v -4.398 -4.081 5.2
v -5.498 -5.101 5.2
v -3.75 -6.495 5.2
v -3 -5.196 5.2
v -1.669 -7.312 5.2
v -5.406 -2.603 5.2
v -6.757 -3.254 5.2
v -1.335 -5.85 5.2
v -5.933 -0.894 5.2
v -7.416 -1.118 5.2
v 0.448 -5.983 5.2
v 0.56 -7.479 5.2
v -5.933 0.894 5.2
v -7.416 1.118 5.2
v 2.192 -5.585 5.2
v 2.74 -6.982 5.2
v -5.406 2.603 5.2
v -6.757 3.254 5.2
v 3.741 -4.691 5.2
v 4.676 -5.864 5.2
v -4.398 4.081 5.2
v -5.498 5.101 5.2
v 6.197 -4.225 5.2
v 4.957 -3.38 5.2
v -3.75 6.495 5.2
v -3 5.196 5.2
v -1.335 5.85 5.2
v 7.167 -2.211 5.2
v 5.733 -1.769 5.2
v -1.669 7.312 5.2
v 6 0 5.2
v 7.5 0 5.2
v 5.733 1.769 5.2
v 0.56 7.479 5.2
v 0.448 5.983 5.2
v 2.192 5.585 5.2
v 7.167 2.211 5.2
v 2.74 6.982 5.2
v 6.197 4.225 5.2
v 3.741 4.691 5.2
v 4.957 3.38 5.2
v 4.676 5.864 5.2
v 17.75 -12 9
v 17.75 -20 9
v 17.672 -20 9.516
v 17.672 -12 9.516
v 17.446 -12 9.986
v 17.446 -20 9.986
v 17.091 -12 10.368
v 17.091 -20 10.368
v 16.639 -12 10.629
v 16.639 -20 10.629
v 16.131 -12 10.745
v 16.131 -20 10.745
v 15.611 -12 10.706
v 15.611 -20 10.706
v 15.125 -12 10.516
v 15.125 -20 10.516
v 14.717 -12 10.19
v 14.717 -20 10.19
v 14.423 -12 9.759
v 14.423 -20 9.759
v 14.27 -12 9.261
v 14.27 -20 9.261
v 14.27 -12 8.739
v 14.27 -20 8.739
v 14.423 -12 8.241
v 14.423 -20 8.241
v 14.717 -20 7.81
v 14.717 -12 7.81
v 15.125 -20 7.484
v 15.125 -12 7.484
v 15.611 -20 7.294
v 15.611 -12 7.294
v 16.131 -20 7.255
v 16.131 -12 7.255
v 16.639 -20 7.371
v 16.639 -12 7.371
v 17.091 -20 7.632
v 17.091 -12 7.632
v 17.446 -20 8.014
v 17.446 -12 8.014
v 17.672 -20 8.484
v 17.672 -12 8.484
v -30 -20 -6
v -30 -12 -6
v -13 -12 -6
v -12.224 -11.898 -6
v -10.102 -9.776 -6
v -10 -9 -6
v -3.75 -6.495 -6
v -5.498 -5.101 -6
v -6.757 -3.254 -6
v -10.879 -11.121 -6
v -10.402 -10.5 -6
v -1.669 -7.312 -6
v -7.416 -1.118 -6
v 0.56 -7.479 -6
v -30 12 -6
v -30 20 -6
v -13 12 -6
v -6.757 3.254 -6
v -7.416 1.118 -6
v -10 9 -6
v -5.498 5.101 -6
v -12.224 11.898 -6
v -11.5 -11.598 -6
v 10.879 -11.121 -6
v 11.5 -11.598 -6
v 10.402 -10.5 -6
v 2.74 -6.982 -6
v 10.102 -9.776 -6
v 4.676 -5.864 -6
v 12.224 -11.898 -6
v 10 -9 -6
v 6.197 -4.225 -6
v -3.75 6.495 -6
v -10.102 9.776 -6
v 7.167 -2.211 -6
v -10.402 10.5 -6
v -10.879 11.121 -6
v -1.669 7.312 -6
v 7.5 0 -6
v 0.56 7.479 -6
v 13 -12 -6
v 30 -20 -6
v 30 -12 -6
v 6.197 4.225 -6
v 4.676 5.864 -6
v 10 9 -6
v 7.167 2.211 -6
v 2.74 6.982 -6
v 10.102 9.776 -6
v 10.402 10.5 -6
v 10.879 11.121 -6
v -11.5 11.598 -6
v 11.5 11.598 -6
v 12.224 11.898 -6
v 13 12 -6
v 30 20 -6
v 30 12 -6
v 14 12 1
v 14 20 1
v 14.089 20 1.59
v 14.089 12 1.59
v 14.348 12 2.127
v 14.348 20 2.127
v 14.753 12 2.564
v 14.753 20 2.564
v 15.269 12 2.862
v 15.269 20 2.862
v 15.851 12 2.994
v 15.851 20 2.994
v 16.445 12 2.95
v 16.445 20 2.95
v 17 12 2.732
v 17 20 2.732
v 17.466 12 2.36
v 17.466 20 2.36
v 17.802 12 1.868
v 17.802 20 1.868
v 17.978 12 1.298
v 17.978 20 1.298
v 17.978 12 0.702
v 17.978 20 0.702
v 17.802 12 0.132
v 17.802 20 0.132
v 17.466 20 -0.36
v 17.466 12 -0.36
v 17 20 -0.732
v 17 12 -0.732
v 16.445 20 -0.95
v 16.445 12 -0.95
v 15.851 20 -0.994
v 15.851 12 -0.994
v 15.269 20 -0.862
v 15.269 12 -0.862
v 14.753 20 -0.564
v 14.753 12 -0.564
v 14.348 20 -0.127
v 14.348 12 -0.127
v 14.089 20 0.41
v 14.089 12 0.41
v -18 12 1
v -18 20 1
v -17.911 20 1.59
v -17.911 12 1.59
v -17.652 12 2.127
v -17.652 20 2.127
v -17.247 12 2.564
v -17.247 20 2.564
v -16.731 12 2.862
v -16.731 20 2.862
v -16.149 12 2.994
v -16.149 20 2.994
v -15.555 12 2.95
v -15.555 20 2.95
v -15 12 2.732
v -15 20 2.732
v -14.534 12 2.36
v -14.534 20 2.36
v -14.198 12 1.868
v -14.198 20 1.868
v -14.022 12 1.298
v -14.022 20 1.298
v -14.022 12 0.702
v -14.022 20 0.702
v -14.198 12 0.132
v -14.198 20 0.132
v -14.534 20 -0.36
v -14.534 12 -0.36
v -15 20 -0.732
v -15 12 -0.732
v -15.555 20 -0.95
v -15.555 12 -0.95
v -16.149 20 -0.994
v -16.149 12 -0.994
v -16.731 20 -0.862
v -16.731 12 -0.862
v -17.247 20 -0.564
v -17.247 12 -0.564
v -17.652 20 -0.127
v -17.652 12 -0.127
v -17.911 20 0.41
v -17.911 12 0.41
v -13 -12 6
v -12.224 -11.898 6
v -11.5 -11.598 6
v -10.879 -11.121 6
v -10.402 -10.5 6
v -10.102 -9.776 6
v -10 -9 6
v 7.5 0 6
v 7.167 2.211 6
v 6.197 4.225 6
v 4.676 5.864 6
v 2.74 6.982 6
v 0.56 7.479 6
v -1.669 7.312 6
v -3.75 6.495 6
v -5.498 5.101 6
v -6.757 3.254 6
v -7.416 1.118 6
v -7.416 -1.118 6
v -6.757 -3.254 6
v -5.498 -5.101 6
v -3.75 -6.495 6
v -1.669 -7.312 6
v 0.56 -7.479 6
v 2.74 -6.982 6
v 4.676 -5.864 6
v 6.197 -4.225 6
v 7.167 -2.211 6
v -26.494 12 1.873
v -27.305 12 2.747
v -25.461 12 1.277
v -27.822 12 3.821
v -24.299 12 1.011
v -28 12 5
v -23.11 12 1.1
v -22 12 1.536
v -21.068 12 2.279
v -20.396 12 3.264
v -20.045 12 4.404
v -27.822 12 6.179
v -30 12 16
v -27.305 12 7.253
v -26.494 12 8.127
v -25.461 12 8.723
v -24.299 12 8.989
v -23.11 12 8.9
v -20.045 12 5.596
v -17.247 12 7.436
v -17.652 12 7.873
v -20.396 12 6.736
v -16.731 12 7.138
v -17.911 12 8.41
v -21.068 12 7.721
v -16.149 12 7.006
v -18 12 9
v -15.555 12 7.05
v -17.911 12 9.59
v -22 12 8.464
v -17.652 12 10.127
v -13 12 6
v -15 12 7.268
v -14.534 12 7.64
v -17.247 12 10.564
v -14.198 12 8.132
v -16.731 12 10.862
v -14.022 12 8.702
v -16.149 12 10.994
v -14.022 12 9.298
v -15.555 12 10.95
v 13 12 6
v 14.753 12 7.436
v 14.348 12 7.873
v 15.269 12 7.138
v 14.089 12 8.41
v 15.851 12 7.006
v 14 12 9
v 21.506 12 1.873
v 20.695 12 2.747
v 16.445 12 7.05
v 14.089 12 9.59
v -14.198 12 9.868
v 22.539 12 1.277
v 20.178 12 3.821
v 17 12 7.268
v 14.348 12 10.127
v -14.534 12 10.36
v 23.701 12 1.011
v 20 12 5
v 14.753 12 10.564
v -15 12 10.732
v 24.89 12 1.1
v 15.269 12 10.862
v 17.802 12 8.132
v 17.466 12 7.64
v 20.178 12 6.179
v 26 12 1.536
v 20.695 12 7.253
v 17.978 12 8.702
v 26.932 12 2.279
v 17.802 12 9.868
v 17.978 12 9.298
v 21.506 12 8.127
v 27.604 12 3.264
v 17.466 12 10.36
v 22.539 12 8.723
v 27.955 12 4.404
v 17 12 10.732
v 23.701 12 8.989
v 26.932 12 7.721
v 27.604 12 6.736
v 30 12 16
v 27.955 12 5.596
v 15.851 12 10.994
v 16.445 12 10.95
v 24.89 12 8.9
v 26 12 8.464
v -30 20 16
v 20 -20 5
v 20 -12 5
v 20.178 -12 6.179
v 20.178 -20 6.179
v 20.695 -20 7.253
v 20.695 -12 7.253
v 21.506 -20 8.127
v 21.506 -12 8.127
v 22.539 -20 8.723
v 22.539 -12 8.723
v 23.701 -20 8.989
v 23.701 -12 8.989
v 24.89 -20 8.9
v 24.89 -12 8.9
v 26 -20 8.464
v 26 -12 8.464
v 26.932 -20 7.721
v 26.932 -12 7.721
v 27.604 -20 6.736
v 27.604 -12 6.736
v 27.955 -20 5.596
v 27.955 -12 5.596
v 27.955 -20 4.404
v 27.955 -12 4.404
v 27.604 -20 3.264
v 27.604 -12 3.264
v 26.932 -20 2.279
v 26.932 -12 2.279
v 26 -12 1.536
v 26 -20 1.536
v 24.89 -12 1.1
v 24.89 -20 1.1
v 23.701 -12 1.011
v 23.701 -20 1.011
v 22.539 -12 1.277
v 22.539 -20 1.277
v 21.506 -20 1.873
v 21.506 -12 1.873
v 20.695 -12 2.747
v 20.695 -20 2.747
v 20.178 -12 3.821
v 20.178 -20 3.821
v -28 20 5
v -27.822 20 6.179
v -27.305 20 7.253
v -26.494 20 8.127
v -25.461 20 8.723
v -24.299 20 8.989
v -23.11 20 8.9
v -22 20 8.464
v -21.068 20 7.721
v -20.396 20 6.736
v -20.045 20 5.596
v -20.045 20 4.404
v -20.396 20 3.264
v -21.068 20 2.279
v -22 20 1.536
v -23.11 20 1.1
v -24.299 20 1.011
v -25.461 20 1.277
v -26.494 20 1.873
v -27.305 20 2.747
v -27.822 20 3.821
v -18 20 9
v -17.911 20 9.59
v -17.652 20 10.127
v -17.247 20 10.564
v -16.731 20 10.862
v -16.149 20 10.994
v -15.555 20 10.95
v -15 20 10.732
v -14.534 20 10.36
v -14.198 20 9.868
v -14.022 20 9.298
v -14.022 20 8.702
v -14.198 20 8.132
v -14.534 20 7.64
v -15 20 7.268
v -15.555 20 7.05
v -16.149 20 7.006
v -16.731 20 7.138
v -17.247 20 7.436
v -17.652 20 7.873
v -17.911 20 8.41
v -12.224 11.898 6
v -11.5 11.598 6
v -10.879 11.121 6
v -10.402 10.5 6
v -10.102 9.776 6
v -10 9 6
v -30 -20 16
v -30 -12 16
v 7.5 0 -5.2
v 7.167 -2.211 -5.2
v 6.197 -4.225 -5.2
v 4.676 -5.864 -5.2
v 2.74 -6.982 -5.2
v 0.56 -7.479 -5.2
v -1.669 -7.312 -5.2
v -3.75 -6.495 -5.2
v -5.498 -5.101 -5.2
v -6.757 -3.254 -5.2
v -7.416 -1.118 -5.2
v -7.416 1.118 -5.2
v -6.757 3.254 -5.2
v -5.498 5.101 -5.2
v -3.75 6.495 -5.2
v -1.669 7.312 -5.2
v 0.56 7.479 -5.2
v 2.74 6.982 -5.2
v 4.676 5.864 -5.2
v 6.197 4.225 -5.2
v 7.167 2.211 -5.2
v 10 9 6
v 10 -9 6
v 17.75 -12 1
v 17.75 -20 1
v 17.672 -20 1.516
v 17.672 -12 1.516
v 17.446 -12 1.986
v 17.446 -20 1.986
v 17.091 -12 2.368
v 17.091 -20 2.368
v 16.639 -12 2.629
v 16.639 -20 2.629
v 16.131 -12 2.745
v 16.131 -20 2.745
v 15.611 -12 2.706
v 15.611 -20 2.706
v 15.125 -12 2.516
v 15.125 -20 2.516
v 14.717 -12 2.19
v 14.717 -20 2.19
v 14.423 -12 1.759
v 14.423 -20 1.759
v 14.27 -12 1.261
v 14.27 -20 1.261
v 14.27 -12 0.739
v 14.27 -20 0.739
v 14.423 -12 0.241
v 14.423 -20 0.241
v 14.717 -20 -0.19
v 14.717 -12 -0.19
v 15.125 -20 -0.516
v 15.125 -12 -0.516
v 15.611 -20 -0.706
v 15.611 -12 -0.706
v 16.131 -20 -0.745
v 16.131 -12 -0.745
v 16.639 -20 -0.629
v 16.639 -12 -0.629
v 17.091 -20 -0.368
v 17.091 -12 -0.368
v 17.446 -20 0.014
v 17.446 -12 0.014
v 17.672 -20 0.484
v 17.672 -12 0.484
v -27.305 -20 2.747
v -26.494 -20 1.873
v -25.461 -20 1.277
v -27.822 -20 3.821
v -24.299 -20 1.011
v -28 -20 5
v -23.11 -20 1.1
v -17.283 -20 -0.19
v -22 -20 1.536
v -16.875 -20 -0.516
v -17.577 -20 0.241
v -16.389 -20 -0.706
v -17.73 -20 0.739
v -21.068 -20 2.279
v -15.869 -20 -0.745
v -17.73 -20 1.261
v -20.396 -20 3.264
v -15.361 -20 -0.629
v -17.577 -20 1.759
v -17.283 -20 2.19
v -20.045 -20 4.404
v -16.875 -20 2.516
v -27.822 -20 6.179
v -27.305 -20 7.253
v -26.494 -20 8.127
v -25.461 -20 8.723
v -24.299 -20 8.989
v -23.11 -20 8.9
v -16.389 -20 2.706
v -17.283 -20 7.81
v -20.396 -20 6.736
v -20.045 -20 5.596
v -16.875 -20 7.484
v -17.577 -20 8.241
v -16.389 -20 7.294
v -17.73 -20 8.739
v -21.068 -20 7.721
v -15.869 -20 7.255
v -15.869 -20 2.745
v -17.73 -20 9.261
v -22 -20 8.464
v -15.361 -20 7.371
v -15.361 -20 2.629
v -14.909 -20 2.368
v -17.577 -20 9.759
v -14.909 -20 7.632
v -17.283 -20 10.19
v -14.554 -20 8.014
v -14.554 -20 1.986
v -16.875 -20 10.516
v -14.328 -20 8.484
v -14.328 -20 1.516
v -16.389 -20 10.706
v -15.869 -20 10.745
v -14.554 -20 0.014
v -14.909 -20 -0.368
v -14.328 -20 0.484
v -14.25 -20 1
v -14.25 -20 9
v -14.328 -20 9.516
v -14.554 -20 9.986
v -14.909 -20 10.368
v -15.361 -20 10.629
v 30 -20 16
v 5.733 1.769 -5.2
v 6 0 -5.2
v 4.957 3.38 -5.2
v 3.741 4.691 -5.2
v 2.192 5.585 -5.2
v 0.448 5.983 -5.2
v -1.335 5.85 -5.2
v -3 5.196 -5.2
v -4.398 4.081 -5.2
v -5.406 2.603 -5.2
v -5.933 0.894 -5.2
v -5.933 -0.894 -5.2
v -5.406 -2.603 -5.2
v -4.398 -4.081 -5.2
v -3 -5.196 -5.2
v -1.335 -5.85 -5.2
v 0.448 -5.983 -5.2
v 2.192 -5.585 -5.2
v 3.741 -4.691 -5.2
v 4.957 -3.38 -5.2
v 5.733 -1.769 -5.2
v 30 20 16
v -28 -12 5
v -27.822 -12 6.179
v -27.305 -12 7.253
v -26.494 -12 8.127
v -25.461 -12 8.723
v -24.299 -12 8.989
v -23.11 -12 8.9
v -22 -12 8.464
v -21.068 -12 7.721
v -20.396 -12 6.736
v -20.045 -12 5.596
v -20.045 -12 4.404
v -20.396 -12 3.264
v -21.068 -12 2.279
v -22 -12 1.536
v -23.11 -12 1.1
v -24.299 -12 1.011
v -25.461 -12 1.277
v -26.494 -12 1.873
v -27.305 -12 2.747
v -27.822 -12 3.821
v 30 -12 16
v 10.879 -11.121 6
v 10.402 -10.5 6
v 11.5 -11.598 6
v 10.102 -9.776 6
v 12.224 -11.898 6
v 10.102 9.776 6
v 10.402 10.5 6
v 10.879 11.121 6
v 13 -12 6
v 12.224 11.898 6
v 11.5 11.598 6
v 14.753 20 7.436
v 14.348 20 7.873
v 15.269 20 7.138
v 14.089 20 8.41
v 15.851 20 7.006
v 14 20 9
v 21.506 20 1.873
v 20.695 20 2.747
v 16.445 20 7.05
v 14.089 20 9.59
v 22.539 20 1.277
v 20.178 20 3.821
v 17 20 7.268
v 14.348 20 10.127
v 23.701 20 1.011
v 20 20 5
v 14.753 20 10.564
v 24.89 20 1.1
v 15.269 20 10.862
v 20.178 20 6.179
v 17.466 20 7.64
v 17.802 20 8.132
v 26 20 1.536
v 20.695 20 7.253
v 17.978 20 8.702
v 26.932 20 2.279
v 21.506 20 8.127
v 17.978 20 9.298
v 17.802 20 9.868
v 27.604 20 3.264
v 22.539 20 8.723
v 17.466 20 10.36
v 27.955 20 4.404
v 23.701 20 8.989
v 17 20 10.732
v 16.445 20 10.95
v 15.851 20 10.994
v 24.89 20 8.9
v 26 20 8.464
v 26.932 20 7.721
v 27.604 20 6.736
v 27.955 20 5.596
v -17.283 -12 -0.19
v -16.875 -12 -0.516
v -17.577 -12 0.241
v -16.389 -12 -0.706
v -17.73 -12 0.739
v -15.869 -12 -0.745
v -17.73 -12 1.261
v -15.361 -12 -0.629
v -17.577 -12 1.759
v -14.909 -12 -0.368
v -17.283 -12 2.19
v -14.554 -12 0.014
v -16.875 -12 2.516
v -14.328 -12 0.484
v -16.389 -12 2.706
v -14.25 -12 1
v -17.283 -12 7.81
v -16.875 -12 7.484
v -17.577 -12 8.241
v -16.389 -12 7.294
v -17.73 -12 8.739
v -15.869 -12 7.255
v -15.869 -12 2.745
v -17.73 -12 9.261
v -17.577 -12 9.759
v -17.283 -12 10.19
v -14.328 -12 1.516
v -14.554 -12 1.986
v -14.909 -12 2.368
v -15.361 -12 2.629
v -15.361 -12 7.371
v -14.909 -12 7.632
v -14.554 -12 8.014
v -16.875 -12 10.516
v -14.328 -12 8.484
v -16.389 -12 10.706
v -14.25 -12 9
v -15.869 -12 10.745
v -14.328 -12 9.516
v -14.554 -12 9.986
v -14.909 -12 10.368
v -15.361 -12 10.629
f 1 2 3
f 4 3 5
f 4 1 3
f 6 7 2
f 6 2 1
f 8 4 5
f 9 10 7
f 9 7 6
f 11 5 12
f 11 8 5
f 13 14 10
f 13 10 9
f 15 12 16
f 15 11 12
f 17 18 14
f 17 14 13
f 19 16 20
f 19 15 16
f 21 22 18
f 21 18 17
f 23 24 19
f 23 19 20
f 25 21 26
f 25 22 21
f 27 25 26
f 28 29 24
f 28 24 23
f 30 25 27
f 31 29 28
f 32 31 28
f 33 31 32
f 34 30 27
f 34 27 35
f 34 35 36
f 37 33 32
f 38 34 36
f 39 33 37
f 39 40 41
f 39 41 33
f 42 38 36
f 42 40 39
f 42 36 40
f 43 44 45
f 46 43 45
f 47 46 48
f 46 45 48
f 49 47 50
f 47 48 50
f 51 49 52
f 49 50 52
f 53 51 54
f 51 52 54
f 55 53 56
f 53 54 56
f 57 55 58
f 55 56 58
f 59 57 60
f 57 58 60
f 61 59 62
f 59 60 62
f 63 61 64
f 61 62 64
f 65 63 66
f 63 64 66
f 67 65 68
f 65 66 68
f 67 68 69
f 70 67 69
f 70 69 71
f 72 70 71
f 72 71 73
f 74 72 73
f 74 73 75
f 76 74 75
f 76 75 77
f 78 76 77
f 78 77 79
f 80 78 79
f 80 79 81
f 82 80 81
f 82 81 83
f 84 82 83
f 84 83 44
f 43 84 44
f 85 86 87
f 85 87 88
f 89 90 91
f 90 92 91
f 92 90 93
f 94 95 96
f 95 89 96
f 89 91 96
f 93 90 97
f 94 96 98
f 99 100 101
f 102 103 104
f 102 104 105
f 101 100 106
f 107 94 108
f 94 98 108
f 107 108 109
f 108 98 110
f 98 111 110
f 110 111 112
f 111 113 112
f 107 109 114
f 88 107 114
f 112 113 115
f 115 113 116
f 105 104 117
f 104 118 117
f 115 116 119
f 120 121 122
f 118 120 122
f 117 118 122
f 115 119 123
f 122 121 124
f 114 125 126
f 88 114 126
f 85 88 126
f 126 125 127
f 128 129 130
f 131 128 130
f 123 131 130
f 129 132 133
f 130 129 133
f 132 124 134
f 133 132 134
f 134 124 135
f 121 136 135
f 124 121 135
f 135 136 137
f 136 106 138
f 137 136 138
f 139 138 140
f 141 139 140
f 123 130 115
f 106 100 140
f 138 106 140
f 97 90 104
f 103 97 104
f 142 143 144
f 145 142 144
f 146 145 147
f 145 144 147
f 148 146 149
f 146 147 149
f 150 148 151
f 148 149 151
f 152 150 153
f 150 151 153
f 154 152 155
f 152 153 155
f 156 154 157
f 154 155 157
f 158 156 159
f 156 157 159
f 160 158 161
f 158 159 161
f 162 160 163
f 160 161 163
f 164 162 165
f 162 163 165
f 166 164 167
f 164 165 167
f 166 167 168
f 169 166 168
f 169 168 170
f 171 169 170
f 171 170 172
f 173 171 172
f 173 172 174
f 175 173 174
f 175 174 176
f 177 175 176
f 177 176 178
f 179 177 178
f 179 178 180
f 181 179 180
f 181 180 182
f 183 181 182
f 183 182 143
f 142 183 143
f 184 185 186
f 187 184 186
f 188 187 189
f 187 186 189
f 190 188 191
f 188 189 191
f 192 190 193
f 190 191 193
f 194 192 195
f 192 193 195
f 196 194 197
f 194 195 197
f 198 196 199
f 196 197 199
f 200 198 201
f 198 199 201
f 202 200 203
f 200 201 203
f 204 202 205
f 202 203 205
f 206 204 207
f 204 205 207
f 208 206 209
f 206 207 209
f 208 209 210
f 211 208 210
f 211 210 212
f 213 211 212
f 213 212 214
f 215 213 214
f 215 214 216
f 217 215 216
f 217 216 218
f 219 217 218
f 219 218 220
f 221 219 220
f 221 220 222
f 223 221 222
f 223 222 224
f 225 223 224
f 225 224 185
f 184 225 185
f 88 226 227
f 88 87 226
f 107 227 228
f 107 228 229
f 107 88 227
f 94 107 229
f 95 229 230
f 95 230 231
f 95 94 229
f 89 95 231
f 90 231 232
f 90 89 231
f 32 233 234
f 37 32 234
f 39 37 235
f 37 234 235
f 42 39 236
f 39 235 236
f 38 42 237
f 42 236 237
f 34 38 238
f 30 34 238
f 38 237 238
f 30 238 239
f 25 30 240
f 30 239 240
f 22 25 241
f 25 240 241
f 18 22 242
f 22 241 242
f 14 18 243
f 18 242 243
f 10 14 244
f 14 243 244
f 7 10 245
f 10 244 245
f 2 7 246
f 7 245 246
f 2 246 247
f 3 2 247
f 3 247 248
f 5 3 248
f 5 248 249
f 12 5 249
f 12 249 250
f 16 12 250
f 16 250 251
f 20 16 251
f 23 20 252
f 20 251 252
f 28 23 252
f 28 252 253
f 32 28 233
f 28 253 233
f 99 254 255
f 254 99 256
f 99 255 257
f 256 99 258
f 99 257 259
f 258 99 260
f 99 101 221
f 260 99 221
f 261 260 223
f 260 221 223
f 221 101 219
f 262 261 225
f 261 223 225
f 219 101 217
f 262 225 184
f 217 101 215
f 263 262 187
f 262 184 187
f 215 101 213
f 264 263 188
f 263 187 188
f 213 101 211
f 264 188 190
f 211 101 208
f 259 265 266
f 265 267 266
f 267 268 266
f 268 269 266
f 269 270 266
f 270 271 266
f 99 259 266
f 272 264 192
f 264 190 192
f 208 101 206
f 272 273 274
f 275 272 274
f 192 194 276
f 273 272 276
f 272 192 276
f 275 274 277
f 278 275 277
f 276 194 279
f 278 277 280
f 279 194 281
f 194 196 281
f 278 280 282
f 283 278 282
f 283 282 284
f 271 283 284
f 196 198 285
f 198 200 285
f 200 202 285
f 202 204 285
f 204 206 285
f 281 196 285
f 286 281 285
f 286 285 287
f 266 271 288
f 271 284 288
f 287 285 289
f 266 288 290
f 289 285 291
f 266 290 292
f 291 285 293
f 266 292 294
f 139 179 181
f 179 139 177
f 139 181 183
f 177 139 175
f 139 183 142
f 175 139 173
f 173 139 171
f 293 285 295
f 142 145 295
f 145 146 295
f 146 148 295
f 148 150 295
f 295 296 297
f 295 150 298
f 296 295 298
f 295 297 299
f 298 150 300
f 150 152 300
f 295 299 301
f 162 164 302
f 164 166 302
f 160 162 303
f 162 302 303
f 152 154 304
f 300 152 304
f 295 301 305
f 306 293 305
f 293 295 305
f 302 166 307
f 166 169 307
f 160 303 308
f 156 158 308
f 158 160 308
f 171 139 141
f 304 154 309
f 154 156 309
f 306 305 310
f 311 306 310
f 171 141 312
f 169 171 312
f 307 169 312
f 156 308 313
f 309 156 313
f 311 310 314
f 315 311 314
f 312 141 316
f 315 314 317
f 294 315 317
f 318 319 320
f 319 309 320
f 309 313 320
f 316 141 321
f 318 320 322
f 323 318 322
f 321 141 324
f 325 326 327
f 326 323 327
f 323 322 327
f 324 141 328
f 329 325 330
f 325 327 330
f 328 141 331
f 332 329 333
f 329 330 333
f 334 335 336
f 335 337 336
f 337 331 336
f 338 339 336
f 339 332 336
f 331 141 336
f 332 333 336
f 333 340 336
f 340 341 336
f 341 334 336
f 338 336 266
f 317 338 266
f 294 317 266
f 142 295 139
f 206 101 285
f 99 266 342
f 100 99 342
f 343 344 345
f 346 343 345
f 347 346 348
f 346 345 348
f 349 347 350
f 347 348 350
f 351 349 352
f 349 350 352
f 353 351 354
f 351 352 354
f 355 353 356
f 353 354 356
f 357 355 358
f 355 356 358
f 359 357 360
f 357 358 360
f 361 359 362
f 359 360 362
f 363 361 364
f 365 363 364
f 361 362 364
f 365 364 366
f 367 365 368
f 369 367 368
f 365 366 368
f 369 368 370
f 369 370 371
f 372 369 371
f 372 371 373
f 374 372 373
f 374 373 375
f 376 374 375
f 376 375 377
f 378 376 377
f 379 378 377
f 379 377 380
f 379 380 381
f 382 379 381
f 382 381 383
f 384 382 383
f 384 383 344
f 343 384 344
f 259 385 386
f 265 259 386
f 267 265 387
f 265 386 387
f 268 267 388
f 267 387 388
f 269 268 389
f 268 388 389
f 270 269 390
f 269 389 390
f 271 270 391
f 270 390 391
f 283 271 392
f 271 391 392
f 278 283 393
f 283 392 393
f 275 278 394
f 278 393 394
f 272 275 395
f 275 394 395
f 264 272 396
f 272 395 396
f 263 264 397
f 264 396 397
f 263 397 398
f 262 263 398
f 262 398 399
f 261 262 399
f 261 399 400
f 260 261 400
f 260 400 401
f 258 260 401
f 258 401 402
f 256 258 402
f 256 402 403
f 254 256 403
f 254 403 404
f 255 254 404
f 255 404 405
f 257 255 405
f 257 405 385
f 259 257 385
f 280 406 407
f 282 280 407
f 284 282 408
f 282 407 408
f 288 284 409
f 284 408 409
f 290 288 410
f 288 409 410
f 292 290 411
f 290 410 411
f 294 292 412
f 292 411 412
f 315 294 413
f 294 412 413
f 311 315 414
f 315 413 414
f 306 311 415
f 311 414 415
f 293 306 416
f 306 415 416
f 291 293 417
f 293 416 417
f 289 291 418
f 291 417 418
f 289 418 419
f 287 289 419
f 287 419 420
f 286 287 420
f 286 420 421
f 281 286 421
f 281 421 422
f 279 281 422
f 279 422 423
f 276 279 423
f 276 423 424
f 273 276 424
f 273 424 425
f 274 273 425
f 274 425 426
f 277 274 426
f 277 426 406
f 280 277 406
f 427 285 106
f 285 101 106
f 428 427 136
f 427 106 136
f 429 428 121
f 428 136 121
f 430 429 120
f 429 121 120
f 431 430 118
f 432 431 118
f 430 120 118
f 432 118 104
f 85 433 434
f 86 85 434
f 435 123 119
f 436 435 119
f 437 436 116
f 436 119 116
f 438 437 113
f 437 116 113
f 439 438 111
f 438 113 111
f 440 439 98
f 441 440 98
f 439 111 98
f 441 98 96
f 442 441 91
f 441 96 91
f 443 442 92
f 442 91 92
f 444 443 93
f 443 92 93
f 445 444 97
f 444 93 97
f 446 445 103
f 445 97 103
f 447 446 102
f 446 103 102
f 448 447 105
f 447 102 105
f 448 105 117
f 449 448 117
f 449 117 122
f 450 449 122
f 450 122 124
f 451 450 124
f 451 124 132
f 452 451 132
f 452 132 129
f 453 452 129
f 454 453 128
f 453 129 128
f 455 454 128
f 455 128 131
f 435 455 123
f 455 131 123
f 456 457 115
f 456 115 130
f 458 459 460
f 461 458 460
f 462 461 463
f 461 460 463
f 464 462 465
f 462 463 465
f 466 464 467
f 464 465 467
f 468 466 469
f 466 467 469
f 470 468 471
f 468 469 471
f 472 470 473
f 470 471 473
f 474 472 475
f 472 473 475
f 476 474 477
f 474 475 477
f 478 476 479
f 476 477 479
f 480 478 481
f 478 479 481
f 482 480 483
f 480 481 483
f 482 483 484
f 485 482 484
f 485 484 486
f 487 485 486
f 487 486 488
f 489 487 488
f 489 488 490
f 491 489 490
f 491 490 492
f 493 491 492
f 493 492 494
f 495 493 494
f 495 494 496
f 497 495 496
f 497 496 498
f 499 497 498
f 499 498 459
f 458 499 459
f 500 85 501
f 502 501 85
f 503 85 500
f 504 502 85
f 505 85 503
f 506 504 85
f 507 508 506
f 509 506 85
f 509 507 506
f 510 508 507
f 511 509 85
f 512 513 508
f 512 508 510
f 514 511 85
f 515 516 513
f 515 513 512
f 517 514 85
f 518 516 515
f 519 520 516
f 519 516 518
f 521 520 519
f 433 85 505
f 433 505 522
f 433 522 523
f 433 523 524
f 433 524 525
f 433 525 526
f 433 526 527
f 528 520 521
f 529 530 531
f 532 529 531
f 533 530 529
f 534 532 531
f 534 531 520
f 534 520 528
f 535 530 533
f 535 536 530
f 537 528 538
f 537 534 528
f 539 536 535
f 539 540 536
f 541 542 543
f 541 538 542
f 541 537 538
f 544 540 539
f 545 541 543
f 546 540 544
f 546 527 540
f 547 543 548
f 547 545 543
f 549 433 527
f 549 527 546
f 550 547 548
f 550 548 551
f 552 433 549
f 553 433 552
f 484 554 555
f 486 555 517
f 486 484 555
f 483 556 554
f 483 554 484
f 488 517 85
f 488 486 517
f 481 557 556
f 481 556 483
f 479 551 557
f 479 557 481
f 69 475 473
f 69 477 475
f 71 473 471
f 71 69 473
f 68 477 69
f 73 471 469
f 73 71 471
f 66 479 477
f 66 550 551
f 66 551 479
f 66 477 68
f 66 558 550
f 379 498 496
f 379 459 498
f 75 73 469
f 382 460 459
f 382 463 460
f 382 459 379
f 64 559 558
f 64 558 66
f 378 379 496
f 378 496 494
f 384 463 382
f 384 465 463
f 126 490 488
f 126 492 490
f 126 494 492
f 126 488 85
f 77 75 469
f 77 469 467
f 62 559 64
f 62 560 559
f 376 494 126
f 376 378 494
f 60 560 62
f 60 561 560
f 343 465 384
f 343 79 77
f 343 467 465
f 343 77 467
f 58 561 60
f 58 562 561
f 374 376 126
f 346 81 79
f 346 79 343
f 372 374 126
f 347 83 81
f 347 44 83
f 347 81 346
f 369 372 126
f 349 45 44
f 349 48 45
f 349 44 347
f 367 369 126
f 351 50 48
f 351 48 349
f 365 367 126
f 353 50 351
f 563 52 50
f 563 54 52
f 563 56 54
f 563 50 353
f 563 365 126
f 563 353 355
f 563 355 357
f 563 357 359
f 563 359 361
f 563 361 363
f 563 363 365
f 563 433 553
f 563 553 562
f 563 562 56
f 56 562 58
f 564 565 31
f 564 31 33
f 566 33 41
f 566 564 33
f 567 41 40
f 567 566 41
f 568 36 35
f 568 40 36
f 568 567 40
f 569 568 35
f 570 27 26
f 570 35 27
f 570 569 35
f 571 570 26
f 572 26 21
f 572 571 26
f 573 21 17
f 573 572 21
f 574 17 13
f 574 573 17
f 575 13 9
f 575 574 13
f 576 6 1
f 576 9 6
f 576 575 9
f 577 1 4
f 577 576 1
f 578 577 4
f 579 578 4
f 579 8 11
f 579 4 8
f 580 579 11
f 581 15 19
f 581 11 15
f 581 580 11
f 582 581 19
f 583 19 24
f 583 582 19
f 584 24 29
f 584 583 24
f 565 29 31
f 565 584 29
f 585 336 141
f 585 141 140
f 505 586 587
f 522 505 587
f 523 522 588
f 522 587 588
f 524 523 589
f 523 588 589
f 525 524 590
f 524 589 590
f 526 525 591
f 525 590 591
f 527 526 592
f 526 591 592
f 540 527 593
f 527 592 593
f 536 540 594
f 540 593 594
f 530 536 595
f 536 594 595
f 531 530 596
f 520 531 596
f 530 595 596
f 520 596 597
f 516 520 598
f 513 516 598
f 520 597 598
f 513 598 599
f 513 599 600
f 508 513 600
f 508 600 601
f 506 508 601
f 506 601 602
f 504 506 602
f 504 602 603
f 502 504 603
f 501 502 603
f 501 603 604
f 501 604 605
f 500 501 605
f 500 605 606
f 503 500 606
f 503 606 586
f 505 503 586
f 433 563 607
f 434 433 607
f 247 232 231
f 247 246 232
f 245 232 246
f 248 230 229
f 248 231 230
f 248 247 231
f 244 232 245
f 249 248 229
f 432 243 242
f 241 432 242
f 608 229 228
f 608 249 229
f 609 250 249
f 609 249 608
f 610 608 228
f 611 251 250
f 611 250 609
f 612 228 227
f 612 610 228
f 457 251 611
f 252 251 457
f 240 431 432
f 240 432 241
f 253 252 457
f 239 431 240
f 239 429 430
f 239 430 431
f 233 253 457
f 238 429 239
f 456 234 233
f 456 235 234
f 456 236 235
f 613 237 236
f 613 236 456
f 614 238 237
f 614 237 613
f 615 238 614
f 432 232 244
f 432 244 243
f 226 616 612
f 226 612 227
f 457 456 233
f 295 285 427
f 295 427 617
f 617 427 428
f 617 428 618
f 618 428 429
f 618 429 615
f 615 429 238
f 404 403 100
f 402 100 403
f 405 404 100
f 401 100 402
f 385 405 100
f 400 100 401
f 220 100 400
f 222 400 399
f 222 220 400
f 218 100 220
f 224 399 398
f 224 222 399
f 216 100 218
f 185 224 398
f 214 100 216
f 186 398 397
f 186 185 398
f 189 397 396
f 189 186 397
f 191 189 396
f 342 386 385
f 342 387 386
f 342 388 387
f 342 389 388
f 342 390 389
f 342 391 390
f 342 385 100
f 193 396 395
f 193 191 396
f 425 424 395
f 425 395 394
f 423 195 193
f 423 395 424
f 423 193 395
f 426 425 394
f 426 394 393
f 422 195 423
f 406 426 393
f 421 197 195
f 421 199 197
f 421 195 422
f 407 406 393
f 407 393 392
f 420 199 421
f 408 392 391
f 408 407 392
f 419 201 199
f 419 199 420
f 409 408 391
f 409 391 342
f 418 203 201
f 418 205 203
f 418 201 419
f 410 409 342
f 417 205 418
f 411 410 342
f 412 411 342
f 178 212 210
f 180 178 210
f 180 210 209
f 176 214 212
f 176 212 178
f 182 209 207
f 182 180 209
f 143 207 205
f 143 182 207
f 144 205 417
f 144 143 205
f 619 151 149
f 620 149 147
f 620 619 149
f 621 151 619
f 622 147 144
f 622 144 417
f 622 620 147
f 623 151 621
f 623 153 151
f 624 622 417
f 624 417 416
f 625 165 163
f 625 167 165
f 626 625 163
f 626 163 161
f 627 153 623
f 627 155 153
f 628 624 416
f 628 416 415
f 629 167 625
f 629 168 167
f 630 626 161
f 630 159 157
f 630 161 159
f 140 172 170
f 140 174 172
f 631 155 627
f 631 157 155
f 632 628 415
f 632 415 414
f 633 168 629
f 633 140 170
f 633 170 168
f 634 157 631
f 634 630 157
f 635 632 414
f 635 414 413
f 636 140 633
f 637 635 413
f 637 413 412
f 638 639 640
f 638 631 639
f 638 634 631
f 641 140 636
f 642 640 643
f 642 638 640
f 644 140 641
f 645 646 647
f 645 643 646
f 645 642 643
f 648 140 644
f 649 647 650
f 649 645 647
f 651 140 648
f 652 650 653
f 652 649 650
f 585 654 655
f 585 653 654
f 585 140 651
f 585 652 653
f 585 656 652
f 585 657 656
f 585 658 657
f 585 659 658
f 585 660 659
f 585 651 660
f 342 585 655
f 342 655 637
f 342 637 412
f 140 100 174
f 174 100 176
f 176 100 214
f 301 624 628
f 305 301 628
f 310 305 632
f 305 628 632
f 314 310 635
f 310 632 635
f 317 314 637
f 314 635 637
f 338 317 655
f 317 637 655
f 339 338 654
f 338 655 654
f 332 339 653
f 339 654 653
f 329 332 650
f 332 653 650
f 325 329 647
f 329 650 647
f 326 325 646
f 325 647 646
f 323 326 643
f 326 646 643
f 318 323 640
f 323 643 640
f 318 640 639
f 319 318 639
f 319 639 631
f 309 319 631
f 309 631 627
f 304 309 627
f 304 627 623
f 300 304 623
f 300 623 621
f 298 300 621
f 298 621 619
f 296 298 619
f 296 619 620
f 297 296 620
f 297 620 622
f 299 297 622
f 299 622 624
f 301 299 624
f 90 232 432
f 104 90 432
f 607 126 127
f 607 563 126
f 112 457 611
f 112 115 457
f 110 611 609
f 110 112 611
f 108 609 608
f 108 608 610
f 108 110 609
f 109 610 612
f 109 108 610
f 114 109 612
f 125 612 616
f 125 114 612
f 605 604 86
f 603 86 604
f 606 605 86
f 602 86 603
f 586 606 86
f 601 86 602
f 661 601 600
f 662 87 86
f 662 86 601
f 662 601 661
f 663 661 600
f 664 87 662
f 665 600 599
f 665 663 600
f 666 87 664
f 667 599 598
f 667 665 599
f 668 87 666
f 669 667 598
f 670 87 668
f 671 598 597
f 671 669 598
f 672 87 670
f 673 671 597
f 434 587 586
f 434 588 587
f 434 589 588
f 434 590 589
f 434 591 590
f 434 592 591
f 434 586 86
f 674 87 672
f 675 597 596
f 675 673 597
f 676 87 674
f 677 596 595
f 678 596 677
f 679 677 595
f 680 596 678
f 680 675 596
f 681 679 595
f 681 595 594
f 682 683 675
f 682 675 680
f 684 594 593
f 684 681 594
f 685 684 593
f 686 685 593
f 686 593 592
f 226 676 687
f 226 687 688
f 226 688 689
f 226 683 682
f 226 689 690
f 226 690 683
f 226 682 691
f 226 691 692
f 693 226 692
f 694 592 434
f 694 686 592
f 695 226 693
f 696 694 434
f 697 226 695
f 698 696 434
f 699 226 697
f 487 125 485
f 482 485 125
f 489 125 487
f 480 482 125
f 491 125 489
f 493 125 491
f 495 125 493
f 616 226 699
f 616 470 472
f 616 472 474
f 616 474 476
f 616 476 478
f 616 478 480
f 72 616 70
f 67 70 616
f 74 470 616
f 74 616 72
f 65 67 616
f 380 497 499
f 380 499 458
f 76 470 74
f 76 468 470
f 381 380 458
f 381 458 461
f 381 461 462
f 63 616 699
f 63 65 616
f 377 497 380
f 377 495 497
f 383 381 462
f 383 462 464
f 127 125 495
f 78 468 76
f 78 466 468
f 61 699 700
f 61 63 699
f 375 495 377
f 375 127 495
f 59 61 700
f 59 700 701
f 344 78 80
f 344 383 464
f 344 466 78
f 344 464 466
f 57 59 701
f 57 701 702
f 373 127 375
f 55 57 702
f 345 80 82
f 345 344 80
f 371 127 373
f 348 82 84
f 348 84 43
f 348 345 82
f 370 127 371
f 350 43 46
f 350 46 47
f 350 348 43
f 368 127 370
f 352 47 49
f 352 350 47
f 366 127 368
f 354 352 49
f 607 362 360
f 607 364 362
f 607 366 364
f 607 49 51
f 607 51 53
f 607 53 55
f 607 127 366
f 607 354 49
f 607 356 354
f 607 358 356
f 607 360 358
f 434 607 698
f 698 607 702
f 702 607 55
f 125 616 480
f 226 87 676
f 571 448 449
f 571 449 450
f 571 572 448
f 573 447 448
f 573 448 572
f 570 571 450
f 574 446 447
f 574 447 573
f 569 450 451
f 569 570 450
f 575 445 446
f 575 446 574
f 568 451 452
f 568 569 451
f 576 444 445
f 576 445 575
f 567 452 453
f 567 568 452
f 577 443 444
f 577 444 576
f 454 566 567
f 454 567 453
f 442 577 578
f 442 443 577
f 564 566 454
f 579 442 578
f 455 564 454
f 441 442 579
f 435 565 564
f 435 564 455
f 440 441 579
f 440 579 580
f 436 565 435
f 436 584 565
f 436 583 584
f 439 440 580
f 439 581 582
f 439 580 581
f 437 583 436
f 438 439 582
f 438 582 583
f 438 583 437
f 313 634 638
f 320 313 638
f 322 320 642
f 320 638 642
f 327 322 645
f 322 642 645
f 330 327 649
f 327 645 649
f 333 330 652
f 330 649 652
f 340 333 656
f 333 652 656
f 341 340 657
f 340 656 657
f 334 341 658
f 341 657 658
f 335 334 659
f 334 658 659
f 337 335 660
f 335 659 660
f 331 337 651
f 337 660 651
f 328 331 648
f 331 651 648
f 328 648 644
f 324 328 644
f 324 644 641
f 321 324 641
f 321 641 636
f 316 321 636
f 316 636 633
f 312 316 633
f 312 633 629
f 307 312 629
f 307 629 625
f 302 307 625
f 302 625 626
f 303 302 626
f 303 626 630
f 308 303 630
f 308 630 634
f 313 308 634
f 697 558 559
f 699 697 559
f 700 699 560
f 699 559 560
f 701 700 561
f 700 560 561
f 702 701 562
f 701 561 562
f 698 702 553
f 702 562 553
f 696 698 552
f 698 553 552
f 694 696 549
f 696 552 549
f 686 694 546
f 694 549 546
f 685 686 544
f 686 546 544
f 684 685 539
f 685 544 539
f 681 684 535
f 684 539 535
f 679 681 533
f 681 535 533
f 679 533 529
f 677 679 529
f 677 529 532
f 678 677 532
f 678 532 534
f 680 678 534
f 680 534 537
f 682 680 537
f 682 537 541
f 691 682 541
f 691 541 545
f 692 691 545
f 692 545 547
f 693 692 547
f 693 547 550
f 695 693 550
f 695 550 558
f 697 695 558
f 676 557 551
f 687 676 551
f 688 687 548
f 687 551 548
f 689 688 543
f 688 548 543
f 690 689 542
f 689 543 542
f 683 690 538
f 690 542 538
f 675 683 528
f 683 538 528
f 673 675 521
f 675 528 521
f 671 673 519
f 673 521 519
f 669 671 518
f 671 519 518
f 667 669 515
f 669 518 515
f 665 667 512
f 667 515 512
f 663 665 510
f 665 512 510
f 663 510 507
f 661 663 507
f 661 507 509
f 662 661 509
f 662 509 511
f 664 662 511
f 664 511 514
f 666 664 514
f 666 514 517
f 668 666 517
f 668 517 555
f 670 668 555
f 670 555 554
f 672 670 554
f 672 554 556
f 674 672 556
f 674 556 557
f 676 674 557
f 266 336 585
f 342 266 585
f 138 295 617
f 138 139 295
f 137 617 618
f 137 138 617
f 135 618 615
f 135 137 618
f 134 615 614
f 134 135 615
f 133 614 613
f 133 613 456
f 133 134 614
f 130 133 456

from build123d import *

# Parameters (mm, degrees)
F0_W      = 60
F0_H      = 40
F0_R      = 6
F1_DEPTH  = 6
F2_W      = 8
F2_H      = 10
F3_DEPTH  = 60
F4_R      = 2
F5_DEPTH  = 10
F6_R      = 1.75
F7_DEPTH  = 10
F8_R      = 7.5
F9_DEPTH  = 0.8
F10_R     = 7.5
F11_DEPTH = 0.8
F12_W     = 20
F12_H     = 24
F13_DEPTH = 25
F14_R     = 3
F15_R     = 4
F16_DEPTH = 40.001


with BuildPart() as f1:
    # F0 (on Top) → F1 (new body, symmetric)
    with BuildSketch(Plane.XY):
        Rectangle(F0_W, F0_H)
        Circle(F0_R, mode=Mode.SUBTRACT)
    extrude(amount=F1_DEPTH, both=True)

    # F2 (on face) → F3 (join, through all)
    with BuildSketch(Plane.YZ.offset(30)):
        with Locations((16, 11)):
            Rectangle(F2_W, F2_H)
        with Locations((-16, 11)):
            Rectangle(F2_W, F2_H)
    extrude(amount=-F3_DEPTH)

    # F4 (on face) → F5 (cut)
    with BuildSketch(Plane(origin=(0, 20, 0), x_dir=(-1, 0, 0), z_dir=(0, 1, 0))):
        with Locations((16, 9)):
            Circle(F4_R)
        with Locations((-16, 9)):
            Circle(F4_R)
        with Locations((16, 1)):
            Circle(F4_R)
        with Locations((-16, 1)):
            Circle(F4_R)
    extrude(amount=-F5_DEPTH, mode=Mode.SUBTRACT)

    # F6 (on face) → F7 (cut)
    with BuildSketch(Plane.XZ.offset(20)):
        with Locations((16, 9)):
            Circle(F6_R)
        with Locations((-16, 9)):
            Circle(F6_R)
        with Locations((16, 1)):
            Circle(F6_R)
        with Locations((-16, 1)):
            Circle(F6_R)
    extrude(amount=-F7_DEPTH, mode=Mode.SUBTRACT)

    # F8 (on face) → F9 (cut)
    with BuildSketch(Plane.XY.offset(6)):
        Circle(F8_R)
    extrude(amount=-F9_DEPTH, mode=Mode.SUBTRACT)

    # F10 (on face) → F11 (cut)
    with BuildSketch(Plane(origin=(0, 0, -6), x_dir=(1, 0, 0), z_dir=(0, 0, -1))):
        Circle(F10_R)
    extrude(amount=-F11_DEPTH, mode=Mode.SUBTRACT)

    # F12 (on face) → F13 (cut)
    with BuildSketch(Plane.XY.offset(6)):
        with Locations((20, 0)):
            Rectangle(F12_W, F12_H)
        with Locations((-20, 0)):
            Rectangle(F12_W, F12_H)
    extrude(amount=-F13_DEPTH, mode=Mode.SUBTRACT)

    # F14
    f14_edges = [f1.edges().sort_by_distance(p)[0] for p in [
        (-10, 12, 0),
        (10, 12, 0),
        (10, -12, 0),
        (-10, -12, 0),
    ]]
    fillet(f14_edges, radius=F14_R)

    # F15 (on face) → F16 (cut, through all)
    with BuildSketch(Plane(origin=(0, 20, 0), x_dir=(-1, 0, 0), z_dir=(0, 1, 0))):
        with Locations((24, 5)):
            Circle(F15_R)
        with Locations((-24, 5)):
            Circle(F15_R)
    extrude(amount=-F16_DEPTH, mode=Mode.SUBTRACT)


solid = f1.part
